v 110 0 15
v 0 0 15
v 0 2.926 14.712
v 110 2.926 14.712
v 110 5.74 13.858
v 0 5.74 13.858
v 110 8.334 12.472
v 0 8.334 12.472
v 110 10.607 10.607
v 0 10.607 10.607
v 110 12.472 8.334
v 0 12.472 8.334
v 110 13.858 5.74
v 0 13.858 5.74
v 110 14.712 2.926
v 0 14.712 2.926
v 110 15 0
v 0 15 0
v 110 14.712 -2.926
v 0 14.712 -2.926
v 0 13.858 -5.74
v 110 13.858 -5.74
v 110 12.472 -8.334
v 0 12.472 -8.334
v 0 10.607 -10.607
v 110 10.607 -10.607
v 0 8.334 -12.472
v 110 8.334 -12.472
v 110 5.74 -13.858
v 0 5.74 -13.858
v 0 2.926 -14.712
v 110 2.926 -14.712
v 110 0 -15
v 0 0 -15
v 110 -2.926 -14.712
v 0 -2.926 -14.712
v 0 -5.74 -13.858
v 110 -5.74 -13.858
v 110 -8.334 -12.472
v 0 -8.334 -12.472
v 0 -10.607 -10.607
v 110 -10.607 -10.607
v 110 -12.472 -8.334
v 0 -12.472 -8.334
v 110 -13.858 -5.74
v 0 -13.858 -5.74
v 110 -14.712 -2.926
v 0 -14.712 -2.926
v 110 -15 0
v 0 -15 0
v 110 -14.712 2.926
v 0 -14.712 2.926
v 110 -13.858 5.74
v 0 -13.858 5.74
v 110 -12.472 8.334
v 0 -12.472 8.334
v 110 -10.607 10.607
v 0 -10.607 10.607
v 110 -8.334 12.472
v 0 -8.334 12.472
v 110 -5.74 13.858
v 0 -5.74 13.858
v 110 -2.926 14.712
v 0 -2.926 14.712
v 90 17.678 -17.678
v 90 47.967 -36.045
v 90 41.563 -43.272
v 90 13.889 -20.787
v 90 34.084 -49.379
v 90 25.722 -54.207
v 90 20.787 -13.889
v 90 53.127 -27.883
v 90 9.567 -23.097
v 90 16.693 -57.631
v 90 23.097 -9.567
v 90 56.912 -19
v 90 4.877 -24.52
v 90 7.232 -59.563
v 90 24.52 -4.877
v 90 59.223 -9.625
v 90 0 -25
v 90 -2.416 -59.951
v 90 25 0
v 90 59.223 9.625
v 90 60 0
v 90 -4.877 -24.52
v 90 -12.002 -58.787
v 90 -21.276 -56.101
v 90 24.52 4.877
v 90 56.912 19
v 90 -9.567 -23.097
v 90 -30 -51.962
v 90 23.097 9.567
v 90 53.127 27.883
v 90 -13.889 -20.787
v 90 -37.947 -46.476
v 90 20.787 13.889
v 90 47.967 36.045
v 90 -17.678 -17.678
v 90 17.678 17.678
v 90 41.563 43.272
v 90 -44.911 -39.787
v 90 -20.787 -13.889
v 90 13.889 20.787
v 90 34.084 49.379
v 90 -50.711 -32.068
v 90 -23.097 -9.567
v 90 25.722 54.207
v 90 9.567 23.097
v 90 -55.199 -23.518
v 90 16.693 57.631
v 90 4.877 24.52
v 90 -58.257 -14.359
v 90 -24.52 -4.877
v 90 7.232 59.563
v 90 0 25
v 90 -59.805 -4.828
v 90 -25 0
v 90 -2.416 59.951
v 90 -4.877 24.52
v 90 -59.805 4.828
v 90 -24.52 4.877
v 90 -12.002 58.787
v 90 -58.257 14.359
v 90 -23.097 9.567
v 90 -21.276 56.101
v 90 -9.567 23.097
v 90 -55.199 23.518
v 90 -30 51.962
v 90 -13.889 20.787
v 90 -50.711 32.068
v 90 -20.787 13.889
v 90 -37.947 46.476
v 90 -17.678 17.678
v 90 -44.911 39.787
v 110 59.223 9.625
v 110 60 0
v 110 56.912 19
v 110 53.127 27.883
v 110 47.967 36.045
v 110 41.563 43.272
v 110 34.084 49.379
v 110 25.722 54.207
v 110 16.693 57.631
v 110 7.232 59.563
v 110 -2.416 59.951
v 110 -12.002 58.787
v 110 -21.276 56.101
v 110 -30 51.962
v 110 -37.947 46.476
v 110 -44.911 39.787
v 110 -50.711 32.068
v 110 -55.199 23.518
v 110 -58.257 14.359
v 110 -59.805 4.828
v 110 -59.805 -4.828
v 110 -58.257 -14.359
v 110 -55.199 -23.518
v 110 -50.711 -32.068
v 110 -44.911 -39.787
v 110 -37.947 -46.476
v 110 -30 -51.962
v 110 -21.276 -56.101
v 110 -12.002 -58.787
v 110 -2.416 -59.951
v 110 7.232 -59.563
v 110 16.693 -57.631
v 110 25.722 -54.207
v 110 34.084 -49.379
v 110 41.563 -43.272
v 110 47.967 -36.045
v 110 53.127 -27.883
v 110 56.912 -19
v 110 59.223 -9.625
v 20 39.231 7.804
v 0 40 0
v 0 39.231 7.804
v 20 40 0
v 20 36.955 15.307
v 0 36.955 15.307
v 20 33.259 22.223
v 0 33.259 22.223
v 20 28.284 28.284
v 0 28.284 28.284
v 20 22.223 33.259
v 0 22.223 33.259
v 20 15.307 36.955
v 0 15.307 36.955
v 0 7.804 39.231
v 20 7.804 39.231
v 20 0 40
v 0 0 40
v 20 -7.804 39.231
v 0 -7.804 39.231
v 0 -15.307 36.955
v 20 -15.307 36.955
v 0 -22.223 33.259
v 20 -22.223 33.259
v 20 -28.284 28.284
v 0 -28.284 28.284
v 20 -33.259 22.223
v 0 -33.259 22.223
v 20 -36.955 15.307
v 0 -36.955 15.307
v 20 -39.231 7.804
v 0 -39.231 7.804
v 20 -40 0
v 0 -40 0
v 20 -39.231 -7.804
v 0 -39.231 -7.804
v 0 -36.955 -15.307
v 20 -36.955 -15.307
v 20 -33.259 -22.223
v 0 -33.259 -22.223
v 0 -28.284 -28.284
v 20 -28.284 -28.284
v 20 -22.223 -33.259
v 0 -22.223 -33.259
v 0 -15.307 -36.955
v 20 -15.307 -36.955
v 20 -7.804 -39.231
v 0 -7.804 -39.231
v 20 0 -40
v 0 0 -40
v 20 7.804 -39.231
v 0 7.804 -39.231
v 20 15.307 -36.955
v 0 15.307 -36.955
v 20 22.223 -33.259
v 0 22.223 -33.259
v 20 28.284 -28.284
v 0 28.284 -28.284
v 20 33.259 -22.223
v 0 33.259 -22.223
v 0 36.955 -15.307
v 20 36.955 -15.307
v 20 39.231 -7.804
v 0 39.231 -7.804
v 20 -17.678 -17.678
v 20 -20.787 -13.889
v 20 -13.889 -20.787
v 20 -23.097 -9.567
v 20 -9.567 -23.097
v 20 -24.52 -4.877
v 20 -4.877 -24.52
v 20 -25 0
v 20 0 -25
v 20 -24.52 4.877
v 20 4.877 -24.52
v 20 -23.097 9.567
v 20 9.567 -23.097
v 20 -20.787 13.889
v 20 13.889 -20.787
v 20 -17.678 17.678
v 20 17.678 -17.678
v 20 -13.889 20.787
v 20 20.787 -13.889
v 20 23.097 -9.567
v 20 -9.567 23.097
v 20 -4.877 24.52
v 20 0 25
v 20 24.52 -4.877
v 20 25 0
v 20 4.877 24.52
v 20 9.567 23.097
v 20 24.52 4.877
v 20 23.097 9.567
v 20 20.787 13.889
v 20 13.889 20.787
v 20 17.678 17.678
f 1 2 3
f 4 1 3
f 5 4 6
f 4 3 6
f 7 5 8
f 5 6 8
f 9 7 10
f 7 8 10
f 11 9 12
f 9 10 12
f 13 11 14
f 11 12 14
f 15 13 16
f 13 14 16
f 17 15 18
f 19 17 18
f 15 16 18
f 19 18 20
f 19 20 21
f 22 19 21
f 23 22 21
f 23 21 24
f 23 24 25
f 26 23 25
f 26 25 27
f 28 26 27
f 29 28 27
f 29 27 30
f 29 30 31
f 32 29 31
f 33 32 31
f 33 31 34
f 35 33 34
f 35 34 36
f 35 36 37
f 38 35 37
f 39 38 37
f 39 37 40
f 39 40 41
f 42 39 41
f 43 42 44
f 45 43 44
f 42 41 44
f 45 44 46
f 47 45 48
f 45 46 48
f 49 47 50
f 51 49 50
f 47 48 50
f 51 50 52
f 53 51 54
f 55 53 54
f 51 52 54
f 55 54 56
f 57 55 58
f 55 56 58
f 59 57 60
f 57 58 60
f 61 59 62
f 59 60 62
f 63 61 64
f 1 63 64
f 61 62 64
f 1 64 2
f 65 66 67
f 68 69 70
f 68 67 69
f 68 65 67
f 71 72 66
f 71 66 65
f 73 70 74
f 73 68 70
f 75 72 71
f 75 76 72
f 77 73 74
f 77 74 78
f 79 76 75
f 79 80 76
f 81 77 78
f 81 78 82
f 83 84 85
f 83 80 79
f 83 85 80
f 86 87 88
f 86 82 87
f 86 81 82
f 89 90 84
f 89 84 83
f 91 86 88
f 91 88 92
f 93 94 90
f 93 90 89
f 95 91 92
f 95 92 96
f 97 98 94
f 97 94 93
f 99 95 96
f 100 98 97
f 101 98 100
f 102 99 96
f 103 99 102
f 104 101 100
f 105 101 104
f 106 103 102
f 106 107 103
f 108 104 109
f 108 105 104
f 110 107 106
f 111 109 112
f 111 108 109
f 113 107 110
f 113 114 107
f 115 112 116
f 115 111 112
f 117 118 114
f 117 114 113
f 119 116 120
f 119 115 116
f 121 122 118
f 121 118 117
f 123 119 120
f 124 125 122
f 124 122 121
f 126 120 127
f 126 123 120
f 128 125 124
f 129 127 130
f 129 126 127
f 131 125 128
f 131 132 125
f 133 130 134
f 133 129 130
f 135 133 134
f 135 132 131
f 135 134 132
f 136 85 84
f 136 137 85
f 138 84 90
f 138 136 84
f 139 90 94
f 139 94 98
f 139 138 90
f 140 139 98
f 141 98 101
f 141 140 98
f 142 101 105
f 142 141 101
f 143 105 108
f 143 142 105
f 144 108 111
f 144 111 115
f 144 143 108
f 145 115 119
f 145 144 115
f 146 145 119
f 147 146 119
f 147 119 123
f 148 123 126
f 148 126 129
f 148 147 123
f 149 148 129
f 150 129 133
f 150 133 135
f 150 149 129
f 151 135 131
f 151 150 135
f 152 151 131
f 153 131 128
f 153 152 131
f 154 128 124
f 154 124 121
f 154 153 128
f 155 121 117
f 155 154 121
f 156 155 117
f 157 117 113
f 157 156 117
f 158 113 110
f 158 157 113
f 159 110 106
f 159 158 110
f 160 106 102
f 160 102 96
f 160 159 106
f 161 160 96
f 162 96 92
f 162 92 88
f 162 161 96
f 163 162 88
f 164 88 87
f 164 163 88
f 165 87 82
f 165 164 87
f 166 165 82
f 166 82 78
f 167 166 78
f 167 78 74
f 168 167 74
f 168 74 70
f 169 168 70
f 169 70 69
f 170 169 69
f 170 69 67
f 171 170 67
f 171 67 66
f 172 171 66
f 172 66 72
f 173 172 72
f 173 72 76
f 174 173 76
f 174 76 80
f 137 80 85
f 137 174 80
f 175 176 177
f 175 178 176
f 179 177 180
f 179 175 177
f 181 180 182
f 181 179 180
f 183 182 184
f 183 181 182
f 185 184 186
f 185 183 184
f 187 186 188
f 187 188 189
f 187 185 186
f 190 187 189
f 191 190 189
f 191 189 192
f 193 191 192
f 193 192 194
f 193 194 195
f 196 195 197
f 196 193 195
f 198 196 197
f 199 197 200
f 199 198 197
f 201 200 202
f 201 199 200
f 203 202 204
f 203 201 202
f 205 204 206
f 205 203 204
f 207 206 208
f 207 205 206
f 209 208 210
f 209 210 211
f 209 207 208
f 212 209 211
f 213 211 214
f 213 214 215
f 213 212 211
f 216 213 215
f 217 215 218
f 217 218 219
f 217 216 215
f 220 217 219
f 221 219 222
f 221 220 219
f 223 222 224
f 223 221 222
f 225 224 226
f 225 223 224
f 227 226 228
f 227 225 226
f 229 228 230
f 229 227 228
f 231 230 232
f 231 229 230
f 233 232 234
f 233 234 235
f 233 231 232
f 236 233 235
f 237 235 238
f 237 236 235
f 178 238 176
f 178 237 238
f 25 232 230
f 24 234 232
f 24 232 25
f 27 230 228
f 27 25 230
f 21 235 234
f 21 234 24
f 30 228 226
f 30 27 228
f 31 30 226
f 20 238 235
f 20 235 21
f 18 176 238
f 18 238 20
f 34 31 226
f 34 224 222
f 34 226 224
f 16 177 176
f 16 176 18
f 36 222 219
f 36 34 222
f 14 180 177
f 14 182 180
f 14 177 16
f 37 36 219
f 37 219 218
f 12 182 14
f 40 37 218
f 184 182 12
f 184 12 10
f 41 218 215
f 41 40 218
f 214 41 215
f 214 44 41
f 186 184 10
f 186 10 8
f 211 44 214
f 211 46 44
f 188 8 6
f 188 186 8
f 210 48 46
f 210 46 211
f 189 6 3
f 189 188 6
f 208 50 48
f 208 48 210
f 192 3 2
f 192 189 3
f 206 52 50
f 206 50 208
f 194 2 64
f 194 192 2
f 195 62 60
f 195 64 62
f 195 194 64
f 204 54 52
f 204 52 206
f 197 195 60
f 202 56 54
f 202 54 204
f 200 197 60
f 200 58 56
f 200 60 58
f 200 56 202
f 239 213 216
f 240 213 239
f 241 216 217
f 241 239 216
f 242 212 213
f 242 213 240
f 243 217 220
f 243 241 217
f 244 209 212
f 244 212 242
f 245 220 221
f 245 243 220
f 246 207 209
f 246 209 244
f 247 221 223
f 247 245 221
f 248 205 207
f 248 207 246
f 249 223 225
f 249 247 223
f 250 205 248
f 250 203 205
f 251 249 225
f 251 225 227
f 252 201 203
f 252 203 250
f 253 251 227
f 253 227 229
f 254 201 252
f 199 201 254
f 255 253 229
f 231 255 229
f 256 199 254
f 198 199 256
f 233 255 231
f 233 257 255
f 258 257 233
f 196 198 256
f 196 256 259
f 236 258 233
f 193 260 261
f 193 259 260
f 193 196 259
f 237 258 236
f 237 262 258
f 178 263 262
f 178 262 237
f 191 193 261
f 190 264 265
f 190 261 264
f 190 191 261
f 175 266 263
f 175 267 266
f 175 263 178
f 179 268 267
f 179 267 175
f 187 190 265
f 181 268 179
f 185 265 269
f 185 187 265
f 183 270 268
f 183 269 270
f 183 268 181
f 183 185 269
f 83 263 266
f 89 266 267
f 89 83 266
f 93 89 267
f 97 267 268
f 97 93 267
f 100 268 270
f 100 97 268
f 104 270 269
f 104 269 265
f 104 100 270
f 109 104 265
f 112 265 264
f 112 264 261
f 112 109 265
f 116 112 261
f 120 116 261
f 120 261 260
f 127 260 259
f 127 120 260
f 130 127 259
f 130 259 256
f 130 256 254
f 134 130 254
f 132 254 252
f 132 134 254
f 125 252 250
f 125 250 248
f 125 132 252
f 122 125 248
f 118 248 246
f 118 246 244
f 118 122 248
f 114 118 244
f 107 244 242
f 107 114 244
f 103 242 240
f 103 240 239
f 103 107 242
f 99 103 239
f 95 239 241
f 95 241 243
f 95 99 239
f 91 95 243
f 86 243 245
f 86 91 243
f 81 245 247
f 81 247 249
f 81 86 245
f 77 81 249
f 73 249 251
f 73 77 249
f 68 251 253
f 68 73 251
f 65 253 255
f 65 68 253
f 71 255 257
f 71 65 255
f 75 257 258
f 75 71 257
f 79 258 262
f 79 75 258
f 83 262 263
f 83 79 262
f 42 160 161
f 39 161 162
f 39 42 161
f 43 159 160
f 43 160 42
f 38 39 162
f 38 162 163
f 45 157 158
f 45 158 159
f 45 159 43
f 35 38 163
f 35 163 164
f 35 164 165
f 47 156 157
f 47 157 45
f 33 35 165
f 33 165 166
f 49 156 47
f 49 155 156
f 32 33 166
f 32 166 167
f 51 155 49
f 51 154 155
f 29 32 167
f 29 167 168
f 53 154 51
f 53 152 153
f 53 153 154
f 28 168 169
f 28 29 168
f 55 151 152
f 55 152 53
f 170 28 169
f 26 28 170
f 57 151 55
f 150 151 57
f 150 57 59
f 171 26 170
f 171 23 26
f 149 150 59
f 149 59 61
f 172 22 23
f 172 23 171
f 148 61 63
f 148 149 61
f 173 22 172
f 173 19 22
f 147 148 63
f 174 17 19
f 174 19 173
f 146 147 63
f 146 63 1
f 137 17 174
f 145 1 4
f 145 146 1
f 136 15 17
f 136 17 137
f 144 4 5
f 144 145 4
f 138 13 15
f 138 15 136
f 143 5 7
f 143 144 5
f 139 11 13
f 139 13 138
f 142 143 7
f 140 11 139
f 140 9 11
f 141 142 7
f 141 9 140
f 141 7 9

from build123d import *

# Parameters (mm, degrees)
SKETCH_3_R          = 15
CUT_EXTRUDE_1_DEPTH = 227


with BuildPart() as part:
    # 스케치2 → 회전1 (revolve)
    with BuildSketch(Plane.XY):
        Polygon((0, 0), (0, 40), (20, 40), (20, 25), (90, 25), (90, 60), (110, 60), (110, 0), align=None)
    revolve(axis=Axis((0, 0, 0), (1, 0, 0)))

    # 스케치3 → 컷-돌출1 (cut)
    with BuildSketch(Plane.ZY):
        Circle(SKETCH_3_R)
    extrude(amount=-CUT_EXTRUDE_1_DEPTH, mode=Mode.SUBTRACT)


solid = part.part
